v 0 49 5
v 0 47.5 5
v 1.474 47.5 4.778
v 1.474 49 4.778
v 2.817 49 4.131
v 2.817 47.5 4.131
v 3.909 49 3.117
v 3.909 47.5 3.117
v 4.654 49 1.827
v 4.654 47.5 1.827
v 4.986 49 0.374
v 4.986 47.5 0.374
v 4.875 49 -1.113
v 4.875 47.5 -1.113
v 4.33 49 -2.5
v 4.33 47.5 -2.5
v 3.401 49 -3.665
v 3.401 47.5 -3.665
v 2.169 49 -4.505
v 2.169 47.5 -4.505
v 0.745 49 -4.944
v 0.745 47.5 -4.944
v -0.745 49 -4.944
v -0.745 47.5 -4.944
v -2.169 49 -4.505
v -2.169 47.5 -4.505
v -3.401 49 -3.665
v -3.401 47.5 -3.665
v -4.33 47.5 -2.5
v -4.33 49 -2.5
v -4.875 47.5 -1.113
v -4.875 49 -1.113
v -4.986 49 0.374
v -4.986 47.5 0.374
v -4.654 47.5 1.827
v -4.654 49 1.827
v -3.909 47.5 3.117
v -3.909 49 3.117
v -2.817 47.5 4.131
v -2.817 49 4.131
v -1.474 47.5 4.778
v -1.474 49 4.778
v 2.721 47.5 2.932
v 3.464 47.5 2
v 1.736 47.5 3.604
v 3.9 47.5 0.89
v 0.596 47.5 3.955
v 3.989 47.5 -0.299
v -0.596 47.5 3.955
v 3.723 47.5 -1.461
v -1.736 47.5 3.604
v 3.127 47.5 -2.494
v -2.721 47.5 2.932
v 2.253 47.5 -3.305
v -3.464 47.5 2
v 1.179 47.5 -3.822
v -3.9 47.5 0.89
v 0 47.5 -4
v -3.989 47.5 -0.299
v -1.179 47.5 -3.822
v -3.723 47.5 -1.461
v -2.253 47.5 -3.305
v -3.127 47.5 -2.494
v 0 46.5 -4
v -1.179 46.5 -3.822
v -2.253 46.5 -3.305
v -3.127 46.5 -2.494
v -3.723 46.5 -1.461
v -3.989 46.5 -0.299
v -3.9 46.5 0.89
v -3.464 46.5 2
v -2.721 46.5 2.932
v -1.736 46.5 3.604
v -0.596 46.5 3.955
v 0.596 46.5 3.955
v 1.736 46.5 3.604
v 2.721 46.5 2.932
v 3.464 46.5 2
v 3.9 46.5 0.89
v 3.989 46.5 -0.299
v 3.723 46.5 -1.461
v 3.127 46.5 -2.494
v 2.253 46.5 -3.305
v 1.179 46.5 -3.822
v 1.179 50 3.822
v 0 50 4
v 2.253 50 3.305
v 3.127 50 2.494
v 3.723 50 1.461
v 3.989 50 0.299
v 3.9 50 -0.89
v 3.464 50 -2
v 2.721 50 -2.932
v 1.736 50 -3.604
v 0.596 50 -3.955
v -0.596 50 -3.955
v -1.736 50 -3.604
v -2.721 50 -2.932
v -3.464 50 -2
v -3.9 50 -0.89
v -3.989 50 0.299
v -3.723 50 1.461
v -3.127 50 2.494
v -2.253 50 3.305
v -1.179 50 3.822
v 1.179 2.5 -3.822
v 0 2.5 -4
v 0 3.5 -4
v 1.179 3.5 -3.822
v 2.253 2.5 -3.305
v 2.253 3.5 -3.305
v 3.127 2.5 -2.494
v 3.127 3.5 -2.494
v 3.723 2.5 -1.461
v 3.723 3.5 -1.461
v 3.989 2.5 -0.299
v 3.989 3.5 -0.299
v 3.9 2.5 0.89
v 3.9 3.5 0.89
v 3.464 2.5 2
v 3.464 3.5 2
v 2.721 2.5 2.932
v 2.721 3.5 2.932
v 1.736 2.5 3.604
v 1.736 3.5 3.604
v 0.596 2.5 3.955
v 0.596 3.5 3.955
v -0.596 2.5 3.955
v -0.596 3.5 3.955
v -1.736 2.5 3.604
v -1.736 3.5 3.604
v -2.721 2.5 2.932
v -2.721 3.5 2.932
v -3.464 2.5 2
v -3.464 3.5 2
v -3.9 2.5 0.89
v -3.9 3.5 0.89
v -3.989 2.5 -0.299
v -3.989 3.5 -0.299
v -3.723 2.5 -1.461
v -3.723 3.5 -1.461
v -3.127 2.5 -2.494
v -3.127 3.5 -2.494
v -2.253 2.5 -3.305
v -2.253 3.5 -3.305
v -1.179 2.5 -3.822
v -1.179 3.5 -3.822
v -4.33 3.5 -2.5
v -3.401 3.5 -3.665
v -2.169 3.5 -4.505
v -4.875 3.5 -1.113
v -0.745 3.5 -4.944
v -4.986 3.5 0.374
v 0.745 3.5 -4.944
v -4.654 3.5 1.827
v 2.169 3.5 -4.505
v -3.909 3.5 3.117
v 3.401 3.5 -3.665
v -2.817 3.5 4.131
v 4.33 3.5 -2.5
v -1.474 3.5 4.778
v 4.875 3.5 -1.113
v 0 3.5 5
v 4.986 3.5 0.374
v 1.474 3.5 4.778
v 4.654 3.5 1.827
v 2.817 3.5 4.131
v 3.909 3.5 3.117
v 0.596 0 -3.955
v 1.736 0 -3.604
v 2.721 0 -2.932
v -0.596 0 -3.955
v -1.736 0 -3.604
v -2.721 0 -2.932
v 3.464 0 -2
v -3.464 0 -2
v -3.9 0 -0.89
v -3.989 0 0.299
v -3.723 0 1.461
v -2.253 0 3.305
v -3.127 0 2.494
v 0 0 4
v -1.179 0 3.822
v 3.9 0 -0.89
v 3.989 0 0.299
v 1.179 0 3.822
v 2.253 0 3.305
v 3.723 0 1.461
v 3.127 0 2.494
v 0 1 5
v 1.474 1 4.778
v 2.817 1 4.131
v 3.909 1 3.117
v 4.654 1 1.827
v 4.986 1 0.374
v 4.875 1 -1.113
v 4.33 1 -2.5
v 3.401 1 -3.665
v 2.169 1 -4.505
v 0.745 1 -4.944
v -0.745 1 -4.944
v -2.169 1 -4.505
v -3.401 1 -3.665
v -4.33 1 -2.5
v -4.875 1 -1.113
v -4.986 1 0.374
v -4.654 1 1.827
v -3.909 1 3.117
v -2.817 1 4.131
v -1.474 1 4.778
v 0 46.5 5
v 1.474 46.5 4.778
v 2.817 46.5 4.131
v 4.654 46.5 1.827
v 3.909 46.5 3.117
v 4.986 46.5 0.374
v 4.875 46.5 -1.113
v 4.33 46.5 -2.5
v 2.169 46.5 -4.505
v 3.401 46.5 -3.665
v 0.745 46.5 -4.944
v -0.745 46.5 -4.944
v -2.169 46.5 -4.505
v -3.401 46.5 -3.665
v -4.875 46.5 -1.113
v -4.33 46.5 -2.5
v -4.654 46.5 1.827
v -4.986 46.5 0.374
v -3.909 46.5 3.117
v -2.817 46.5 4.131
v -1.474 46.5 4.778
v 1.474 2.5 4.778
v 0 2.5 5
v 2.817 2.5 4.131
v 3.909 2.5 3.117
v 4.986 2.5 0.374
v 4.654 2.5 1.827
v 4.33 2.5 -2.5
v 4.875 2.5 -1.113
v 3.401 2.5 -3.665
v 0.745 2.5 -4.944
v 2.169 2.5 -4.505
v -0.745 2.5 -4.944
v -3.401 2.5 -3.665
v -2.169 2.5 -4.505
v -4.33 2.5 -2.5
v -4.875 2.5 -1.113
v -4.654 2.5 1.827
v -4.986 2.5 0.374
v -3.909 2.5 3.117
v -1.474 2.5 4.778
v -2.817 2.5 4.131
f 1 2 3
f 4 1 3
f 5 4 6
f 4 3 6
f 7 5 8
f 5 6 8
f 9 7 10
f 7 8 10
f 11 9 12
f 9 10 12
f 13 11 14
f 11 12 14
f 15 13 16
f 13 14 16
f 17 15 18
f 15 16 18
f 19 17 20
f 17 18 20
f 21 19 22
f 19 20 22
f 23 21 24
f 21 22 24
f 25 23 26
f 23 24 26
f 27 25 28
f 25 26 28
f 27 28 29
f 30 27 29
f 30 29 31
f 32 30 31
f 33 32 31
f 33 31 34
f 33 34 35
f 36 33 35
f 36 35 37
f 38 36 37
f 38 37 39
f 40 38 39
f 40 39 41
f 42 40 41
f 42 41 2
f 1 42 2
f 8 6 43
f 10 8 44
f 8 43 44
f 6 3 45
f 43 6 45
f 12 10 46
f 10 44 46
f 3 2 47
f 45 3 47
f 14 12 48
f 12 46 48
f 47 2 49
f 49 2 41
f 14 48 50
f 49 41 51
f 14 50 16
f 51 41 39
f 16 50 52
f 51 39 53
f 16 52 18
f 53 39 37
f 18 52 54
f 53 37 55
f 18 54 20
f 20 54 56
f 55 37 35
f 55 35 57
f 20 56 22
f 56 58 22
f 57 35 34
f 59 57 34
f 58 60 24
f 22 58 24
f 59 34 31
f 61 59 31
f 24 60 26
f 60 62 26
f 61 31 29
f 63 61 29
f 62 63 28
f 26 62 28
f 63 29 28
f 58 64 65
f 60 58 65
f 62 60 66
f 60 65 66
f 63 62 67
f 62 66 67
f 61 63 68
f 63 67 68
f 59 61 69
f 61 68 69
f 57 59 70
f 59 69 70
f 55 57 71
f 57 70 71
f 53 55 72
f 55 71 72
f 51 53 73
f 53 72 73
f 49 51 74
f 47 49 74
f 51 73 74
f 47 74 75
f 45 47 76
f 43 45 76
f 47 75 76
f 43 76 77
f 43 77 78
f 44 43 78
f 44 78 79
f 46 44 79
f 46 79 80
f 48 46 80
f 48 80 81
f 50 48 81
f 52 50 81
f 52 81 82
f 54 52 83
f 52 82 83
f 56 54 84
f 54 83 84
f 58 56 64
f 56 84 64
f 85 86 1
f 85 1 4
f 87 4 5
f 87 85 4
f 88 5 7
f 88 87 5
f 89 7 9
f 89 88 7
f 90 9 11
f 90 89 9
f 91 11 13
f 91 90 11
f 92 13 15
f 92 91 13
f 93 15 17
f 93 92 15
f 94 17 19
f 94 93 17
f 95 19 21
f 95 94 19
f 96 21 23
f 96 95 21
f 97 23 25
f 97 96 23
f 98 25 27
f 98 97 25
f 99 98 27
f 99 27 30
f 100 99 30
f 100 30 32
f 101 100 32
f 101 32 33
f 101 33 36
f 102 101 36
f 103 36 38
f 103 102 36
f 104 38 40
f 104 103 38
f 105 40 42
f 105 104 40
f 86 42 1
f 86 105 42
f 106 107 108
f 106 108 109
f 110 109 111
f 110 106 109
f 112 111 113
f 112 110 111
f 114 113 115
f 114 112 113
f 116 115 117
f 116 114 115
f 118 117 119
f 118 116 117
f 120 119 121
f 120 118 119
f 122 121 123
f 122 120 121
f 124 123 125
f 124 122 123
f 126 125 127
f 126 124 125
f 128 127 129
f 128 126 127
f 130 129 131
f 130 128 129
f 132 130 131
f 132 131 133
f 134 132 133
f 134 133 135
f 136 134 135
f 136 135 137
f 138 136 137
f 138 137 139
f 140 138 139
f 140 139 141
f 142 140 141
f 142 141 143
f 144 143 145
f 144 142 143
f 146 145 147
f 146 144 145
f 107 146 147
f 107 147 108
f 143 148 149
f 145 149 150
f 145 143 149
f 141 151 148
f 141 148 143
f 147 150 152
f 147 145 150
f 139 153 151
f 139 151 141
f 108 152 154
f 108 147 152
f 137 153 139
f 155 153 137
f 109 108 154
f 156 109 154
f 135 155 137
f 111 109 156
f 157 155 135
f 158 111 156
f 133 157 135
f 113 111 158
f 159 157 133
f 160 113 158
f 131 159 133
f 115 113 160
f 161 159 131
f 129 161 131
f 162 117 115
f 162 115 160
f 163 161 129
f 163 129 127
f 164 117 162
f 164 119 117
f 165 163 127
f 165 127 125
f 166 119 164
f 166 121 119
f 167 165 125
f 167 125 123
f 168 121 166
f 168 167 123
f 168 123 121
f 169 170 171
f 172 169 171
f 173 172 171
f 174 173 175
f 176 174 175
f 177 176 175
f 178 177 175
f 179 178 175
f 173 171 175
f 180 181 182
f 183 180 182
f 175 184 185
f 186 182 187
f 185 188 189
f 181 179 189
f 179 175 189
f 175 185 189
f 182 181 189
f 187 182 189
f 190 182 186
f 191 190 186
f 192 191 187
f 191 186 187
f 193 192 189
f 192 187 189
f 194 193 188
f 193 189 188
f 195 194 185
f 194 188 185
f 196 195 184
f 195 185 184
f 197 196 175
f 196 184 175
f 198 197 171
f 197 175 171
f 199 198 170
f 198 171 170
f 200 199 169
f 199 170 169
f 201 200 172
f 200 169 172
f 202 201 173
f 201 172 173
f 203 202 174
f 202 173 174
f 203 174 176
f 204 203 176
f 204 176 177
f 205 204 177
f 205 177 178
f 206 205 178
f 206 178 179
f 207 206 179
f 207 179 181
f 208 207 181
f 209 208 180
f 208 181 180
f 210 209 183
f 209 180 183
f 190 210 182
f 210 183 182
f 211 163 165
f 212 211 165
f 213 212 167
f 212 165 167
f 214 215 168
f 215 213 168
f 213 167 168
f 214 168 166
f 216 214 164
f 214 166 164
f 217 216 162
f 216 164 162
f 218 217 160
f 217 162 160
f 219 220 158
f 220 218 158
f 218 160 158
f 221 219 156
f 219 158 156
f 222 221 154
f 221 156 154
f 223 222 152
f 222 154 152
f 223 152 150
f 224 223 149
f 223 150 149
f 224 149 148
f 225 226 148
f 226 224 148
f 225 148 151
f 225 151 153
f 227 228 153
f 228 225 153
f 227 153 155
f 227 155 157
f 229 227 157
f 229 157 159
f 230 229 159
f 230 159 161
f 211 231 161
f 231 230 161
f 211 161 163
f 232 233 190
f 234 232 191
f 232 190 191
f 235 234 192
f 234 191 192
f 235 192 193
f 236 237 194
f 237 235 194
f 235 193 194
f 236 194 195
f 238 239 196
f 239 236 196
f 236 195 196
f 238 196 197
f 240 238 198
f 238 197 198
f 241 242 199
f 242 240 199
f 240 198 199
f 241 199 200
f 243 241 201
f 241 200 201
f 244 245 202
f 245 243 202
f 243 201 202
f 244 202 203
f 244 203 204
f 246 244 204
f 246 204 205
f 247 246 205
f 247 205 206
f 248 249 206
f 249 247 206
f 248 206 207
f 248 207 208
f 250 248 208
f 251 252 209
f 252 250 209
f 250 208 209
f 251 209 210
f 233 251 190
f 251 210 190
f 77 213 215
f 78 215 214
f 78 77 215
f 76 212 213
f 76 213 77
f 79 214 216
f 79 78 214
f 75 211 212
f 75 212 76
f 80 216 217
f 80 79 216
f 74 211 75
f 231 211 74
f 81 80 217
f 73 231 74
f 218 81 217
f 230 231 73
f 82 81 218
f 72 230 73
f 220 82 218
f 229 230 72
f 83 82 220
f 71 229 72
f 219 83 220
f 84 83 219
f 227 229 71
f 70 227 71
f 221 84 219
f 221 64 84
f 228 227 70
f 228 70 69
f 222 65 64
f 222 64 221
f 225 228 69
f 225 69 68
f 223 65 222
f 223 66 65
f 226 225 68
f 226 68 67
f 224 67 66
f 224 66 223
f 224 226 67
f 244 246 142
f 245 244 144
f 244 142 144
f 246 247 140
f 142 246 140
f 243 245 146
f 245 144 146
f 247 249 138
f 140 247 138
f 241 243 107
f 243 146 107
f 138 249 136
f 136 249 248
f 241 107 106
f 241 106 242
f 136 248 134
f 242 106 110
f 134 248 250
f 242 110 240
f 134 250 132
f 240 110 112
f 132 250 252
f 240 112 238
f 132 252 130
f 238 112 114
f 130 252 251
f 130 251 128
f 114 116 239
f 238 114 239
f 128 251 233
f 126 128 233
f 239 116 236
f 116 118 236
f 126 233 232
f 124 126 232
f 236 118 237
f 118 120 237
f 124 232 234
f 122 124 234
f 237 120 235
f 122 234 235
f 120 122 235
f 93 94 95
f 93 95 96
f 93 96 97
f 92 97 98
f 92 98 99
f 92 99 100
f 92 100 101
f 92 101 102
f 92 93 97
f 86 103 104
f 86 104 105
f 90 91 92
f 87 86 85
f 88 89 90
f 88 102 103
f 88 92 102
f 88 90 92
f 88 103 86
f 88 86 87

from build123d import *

# Parameters (mm, degrees)
SKETCH1_R           = 5
BOSS_EXTRUDE1_DEPTH = 50
CHAMFER1_SIZE       = 1
CUT_EXTRUDE1_START  = -2.5
SKETCH2_R           = 6
SKETCH2_R_2         = 4
CUT_EXTRUDE1_DEPTH  = 1
CUT_EXTRUDE2_START  = -3.5
SKETCH3_R           = 5
SKETCH3_R_2         = 4
CUT_EXTRUDE2_DEPTH  = 1


with BuildPart() as part:
    # Sketch1 → Boss-Extrude1 (new body)
    with BuildSketch(Plane(origin=(0, 0, 0), x_dir=(1, 0, 0), z_dir=(0, 1, 0))):
        with Locations(Location((0, 0, 0), (0, 0, 270))):
            Circle(SKETCH1_R)
    extrude(amount=BOSS_EXTRUDE1_DEPTH)

    # Chamfer1
    chamfer1_edges = [part.edges().sort_by_distance(p)[0] for p in [
        (0, 0, -5),
        (0, 50, -5),
    ]]
    chamfer(chamfer1_edges, length=CHAMFER1_SIZE)

    # Sketch2 → Cut-Extrude1 (cut)
    with BuildSketch(Plane.XZ.offset(CUT_EXTRUDE1_START)):
        Circle(SKETCH2_R)
        with Locations(Location((0, 0, 0), (0, 0, 270))):
            Circle(SKETCH2_R_2, mode=Mode.SUBTRACT)
    extrude(amount=-CUT_EXTRUDE1_DEPTH, mode=Mode.SUBTRACT)

    # Sketch3 → Cut-Extrude2 (cut)
    with BuildSketch(Plane(origin=(0, 50, 0), x_dir=(1, 0, 0), z_dir=(0, 1, 0)).offset(CUT_EXTRUDE2_START)):
        with Locations(Location((0, 0, 0), (0, 0, 90))):
            Circle(SKETCH3_R)
        with Locations(Location((0, 0, 0), (0, 0, 90))):
            Circle(SKETCH3_R_2, mode=Mode.SUBTRACT)
    extrude(amount=CUT_EXTRUDE2_DEPTH, mode=Mode.SUBTRACT)


solid = part.part
